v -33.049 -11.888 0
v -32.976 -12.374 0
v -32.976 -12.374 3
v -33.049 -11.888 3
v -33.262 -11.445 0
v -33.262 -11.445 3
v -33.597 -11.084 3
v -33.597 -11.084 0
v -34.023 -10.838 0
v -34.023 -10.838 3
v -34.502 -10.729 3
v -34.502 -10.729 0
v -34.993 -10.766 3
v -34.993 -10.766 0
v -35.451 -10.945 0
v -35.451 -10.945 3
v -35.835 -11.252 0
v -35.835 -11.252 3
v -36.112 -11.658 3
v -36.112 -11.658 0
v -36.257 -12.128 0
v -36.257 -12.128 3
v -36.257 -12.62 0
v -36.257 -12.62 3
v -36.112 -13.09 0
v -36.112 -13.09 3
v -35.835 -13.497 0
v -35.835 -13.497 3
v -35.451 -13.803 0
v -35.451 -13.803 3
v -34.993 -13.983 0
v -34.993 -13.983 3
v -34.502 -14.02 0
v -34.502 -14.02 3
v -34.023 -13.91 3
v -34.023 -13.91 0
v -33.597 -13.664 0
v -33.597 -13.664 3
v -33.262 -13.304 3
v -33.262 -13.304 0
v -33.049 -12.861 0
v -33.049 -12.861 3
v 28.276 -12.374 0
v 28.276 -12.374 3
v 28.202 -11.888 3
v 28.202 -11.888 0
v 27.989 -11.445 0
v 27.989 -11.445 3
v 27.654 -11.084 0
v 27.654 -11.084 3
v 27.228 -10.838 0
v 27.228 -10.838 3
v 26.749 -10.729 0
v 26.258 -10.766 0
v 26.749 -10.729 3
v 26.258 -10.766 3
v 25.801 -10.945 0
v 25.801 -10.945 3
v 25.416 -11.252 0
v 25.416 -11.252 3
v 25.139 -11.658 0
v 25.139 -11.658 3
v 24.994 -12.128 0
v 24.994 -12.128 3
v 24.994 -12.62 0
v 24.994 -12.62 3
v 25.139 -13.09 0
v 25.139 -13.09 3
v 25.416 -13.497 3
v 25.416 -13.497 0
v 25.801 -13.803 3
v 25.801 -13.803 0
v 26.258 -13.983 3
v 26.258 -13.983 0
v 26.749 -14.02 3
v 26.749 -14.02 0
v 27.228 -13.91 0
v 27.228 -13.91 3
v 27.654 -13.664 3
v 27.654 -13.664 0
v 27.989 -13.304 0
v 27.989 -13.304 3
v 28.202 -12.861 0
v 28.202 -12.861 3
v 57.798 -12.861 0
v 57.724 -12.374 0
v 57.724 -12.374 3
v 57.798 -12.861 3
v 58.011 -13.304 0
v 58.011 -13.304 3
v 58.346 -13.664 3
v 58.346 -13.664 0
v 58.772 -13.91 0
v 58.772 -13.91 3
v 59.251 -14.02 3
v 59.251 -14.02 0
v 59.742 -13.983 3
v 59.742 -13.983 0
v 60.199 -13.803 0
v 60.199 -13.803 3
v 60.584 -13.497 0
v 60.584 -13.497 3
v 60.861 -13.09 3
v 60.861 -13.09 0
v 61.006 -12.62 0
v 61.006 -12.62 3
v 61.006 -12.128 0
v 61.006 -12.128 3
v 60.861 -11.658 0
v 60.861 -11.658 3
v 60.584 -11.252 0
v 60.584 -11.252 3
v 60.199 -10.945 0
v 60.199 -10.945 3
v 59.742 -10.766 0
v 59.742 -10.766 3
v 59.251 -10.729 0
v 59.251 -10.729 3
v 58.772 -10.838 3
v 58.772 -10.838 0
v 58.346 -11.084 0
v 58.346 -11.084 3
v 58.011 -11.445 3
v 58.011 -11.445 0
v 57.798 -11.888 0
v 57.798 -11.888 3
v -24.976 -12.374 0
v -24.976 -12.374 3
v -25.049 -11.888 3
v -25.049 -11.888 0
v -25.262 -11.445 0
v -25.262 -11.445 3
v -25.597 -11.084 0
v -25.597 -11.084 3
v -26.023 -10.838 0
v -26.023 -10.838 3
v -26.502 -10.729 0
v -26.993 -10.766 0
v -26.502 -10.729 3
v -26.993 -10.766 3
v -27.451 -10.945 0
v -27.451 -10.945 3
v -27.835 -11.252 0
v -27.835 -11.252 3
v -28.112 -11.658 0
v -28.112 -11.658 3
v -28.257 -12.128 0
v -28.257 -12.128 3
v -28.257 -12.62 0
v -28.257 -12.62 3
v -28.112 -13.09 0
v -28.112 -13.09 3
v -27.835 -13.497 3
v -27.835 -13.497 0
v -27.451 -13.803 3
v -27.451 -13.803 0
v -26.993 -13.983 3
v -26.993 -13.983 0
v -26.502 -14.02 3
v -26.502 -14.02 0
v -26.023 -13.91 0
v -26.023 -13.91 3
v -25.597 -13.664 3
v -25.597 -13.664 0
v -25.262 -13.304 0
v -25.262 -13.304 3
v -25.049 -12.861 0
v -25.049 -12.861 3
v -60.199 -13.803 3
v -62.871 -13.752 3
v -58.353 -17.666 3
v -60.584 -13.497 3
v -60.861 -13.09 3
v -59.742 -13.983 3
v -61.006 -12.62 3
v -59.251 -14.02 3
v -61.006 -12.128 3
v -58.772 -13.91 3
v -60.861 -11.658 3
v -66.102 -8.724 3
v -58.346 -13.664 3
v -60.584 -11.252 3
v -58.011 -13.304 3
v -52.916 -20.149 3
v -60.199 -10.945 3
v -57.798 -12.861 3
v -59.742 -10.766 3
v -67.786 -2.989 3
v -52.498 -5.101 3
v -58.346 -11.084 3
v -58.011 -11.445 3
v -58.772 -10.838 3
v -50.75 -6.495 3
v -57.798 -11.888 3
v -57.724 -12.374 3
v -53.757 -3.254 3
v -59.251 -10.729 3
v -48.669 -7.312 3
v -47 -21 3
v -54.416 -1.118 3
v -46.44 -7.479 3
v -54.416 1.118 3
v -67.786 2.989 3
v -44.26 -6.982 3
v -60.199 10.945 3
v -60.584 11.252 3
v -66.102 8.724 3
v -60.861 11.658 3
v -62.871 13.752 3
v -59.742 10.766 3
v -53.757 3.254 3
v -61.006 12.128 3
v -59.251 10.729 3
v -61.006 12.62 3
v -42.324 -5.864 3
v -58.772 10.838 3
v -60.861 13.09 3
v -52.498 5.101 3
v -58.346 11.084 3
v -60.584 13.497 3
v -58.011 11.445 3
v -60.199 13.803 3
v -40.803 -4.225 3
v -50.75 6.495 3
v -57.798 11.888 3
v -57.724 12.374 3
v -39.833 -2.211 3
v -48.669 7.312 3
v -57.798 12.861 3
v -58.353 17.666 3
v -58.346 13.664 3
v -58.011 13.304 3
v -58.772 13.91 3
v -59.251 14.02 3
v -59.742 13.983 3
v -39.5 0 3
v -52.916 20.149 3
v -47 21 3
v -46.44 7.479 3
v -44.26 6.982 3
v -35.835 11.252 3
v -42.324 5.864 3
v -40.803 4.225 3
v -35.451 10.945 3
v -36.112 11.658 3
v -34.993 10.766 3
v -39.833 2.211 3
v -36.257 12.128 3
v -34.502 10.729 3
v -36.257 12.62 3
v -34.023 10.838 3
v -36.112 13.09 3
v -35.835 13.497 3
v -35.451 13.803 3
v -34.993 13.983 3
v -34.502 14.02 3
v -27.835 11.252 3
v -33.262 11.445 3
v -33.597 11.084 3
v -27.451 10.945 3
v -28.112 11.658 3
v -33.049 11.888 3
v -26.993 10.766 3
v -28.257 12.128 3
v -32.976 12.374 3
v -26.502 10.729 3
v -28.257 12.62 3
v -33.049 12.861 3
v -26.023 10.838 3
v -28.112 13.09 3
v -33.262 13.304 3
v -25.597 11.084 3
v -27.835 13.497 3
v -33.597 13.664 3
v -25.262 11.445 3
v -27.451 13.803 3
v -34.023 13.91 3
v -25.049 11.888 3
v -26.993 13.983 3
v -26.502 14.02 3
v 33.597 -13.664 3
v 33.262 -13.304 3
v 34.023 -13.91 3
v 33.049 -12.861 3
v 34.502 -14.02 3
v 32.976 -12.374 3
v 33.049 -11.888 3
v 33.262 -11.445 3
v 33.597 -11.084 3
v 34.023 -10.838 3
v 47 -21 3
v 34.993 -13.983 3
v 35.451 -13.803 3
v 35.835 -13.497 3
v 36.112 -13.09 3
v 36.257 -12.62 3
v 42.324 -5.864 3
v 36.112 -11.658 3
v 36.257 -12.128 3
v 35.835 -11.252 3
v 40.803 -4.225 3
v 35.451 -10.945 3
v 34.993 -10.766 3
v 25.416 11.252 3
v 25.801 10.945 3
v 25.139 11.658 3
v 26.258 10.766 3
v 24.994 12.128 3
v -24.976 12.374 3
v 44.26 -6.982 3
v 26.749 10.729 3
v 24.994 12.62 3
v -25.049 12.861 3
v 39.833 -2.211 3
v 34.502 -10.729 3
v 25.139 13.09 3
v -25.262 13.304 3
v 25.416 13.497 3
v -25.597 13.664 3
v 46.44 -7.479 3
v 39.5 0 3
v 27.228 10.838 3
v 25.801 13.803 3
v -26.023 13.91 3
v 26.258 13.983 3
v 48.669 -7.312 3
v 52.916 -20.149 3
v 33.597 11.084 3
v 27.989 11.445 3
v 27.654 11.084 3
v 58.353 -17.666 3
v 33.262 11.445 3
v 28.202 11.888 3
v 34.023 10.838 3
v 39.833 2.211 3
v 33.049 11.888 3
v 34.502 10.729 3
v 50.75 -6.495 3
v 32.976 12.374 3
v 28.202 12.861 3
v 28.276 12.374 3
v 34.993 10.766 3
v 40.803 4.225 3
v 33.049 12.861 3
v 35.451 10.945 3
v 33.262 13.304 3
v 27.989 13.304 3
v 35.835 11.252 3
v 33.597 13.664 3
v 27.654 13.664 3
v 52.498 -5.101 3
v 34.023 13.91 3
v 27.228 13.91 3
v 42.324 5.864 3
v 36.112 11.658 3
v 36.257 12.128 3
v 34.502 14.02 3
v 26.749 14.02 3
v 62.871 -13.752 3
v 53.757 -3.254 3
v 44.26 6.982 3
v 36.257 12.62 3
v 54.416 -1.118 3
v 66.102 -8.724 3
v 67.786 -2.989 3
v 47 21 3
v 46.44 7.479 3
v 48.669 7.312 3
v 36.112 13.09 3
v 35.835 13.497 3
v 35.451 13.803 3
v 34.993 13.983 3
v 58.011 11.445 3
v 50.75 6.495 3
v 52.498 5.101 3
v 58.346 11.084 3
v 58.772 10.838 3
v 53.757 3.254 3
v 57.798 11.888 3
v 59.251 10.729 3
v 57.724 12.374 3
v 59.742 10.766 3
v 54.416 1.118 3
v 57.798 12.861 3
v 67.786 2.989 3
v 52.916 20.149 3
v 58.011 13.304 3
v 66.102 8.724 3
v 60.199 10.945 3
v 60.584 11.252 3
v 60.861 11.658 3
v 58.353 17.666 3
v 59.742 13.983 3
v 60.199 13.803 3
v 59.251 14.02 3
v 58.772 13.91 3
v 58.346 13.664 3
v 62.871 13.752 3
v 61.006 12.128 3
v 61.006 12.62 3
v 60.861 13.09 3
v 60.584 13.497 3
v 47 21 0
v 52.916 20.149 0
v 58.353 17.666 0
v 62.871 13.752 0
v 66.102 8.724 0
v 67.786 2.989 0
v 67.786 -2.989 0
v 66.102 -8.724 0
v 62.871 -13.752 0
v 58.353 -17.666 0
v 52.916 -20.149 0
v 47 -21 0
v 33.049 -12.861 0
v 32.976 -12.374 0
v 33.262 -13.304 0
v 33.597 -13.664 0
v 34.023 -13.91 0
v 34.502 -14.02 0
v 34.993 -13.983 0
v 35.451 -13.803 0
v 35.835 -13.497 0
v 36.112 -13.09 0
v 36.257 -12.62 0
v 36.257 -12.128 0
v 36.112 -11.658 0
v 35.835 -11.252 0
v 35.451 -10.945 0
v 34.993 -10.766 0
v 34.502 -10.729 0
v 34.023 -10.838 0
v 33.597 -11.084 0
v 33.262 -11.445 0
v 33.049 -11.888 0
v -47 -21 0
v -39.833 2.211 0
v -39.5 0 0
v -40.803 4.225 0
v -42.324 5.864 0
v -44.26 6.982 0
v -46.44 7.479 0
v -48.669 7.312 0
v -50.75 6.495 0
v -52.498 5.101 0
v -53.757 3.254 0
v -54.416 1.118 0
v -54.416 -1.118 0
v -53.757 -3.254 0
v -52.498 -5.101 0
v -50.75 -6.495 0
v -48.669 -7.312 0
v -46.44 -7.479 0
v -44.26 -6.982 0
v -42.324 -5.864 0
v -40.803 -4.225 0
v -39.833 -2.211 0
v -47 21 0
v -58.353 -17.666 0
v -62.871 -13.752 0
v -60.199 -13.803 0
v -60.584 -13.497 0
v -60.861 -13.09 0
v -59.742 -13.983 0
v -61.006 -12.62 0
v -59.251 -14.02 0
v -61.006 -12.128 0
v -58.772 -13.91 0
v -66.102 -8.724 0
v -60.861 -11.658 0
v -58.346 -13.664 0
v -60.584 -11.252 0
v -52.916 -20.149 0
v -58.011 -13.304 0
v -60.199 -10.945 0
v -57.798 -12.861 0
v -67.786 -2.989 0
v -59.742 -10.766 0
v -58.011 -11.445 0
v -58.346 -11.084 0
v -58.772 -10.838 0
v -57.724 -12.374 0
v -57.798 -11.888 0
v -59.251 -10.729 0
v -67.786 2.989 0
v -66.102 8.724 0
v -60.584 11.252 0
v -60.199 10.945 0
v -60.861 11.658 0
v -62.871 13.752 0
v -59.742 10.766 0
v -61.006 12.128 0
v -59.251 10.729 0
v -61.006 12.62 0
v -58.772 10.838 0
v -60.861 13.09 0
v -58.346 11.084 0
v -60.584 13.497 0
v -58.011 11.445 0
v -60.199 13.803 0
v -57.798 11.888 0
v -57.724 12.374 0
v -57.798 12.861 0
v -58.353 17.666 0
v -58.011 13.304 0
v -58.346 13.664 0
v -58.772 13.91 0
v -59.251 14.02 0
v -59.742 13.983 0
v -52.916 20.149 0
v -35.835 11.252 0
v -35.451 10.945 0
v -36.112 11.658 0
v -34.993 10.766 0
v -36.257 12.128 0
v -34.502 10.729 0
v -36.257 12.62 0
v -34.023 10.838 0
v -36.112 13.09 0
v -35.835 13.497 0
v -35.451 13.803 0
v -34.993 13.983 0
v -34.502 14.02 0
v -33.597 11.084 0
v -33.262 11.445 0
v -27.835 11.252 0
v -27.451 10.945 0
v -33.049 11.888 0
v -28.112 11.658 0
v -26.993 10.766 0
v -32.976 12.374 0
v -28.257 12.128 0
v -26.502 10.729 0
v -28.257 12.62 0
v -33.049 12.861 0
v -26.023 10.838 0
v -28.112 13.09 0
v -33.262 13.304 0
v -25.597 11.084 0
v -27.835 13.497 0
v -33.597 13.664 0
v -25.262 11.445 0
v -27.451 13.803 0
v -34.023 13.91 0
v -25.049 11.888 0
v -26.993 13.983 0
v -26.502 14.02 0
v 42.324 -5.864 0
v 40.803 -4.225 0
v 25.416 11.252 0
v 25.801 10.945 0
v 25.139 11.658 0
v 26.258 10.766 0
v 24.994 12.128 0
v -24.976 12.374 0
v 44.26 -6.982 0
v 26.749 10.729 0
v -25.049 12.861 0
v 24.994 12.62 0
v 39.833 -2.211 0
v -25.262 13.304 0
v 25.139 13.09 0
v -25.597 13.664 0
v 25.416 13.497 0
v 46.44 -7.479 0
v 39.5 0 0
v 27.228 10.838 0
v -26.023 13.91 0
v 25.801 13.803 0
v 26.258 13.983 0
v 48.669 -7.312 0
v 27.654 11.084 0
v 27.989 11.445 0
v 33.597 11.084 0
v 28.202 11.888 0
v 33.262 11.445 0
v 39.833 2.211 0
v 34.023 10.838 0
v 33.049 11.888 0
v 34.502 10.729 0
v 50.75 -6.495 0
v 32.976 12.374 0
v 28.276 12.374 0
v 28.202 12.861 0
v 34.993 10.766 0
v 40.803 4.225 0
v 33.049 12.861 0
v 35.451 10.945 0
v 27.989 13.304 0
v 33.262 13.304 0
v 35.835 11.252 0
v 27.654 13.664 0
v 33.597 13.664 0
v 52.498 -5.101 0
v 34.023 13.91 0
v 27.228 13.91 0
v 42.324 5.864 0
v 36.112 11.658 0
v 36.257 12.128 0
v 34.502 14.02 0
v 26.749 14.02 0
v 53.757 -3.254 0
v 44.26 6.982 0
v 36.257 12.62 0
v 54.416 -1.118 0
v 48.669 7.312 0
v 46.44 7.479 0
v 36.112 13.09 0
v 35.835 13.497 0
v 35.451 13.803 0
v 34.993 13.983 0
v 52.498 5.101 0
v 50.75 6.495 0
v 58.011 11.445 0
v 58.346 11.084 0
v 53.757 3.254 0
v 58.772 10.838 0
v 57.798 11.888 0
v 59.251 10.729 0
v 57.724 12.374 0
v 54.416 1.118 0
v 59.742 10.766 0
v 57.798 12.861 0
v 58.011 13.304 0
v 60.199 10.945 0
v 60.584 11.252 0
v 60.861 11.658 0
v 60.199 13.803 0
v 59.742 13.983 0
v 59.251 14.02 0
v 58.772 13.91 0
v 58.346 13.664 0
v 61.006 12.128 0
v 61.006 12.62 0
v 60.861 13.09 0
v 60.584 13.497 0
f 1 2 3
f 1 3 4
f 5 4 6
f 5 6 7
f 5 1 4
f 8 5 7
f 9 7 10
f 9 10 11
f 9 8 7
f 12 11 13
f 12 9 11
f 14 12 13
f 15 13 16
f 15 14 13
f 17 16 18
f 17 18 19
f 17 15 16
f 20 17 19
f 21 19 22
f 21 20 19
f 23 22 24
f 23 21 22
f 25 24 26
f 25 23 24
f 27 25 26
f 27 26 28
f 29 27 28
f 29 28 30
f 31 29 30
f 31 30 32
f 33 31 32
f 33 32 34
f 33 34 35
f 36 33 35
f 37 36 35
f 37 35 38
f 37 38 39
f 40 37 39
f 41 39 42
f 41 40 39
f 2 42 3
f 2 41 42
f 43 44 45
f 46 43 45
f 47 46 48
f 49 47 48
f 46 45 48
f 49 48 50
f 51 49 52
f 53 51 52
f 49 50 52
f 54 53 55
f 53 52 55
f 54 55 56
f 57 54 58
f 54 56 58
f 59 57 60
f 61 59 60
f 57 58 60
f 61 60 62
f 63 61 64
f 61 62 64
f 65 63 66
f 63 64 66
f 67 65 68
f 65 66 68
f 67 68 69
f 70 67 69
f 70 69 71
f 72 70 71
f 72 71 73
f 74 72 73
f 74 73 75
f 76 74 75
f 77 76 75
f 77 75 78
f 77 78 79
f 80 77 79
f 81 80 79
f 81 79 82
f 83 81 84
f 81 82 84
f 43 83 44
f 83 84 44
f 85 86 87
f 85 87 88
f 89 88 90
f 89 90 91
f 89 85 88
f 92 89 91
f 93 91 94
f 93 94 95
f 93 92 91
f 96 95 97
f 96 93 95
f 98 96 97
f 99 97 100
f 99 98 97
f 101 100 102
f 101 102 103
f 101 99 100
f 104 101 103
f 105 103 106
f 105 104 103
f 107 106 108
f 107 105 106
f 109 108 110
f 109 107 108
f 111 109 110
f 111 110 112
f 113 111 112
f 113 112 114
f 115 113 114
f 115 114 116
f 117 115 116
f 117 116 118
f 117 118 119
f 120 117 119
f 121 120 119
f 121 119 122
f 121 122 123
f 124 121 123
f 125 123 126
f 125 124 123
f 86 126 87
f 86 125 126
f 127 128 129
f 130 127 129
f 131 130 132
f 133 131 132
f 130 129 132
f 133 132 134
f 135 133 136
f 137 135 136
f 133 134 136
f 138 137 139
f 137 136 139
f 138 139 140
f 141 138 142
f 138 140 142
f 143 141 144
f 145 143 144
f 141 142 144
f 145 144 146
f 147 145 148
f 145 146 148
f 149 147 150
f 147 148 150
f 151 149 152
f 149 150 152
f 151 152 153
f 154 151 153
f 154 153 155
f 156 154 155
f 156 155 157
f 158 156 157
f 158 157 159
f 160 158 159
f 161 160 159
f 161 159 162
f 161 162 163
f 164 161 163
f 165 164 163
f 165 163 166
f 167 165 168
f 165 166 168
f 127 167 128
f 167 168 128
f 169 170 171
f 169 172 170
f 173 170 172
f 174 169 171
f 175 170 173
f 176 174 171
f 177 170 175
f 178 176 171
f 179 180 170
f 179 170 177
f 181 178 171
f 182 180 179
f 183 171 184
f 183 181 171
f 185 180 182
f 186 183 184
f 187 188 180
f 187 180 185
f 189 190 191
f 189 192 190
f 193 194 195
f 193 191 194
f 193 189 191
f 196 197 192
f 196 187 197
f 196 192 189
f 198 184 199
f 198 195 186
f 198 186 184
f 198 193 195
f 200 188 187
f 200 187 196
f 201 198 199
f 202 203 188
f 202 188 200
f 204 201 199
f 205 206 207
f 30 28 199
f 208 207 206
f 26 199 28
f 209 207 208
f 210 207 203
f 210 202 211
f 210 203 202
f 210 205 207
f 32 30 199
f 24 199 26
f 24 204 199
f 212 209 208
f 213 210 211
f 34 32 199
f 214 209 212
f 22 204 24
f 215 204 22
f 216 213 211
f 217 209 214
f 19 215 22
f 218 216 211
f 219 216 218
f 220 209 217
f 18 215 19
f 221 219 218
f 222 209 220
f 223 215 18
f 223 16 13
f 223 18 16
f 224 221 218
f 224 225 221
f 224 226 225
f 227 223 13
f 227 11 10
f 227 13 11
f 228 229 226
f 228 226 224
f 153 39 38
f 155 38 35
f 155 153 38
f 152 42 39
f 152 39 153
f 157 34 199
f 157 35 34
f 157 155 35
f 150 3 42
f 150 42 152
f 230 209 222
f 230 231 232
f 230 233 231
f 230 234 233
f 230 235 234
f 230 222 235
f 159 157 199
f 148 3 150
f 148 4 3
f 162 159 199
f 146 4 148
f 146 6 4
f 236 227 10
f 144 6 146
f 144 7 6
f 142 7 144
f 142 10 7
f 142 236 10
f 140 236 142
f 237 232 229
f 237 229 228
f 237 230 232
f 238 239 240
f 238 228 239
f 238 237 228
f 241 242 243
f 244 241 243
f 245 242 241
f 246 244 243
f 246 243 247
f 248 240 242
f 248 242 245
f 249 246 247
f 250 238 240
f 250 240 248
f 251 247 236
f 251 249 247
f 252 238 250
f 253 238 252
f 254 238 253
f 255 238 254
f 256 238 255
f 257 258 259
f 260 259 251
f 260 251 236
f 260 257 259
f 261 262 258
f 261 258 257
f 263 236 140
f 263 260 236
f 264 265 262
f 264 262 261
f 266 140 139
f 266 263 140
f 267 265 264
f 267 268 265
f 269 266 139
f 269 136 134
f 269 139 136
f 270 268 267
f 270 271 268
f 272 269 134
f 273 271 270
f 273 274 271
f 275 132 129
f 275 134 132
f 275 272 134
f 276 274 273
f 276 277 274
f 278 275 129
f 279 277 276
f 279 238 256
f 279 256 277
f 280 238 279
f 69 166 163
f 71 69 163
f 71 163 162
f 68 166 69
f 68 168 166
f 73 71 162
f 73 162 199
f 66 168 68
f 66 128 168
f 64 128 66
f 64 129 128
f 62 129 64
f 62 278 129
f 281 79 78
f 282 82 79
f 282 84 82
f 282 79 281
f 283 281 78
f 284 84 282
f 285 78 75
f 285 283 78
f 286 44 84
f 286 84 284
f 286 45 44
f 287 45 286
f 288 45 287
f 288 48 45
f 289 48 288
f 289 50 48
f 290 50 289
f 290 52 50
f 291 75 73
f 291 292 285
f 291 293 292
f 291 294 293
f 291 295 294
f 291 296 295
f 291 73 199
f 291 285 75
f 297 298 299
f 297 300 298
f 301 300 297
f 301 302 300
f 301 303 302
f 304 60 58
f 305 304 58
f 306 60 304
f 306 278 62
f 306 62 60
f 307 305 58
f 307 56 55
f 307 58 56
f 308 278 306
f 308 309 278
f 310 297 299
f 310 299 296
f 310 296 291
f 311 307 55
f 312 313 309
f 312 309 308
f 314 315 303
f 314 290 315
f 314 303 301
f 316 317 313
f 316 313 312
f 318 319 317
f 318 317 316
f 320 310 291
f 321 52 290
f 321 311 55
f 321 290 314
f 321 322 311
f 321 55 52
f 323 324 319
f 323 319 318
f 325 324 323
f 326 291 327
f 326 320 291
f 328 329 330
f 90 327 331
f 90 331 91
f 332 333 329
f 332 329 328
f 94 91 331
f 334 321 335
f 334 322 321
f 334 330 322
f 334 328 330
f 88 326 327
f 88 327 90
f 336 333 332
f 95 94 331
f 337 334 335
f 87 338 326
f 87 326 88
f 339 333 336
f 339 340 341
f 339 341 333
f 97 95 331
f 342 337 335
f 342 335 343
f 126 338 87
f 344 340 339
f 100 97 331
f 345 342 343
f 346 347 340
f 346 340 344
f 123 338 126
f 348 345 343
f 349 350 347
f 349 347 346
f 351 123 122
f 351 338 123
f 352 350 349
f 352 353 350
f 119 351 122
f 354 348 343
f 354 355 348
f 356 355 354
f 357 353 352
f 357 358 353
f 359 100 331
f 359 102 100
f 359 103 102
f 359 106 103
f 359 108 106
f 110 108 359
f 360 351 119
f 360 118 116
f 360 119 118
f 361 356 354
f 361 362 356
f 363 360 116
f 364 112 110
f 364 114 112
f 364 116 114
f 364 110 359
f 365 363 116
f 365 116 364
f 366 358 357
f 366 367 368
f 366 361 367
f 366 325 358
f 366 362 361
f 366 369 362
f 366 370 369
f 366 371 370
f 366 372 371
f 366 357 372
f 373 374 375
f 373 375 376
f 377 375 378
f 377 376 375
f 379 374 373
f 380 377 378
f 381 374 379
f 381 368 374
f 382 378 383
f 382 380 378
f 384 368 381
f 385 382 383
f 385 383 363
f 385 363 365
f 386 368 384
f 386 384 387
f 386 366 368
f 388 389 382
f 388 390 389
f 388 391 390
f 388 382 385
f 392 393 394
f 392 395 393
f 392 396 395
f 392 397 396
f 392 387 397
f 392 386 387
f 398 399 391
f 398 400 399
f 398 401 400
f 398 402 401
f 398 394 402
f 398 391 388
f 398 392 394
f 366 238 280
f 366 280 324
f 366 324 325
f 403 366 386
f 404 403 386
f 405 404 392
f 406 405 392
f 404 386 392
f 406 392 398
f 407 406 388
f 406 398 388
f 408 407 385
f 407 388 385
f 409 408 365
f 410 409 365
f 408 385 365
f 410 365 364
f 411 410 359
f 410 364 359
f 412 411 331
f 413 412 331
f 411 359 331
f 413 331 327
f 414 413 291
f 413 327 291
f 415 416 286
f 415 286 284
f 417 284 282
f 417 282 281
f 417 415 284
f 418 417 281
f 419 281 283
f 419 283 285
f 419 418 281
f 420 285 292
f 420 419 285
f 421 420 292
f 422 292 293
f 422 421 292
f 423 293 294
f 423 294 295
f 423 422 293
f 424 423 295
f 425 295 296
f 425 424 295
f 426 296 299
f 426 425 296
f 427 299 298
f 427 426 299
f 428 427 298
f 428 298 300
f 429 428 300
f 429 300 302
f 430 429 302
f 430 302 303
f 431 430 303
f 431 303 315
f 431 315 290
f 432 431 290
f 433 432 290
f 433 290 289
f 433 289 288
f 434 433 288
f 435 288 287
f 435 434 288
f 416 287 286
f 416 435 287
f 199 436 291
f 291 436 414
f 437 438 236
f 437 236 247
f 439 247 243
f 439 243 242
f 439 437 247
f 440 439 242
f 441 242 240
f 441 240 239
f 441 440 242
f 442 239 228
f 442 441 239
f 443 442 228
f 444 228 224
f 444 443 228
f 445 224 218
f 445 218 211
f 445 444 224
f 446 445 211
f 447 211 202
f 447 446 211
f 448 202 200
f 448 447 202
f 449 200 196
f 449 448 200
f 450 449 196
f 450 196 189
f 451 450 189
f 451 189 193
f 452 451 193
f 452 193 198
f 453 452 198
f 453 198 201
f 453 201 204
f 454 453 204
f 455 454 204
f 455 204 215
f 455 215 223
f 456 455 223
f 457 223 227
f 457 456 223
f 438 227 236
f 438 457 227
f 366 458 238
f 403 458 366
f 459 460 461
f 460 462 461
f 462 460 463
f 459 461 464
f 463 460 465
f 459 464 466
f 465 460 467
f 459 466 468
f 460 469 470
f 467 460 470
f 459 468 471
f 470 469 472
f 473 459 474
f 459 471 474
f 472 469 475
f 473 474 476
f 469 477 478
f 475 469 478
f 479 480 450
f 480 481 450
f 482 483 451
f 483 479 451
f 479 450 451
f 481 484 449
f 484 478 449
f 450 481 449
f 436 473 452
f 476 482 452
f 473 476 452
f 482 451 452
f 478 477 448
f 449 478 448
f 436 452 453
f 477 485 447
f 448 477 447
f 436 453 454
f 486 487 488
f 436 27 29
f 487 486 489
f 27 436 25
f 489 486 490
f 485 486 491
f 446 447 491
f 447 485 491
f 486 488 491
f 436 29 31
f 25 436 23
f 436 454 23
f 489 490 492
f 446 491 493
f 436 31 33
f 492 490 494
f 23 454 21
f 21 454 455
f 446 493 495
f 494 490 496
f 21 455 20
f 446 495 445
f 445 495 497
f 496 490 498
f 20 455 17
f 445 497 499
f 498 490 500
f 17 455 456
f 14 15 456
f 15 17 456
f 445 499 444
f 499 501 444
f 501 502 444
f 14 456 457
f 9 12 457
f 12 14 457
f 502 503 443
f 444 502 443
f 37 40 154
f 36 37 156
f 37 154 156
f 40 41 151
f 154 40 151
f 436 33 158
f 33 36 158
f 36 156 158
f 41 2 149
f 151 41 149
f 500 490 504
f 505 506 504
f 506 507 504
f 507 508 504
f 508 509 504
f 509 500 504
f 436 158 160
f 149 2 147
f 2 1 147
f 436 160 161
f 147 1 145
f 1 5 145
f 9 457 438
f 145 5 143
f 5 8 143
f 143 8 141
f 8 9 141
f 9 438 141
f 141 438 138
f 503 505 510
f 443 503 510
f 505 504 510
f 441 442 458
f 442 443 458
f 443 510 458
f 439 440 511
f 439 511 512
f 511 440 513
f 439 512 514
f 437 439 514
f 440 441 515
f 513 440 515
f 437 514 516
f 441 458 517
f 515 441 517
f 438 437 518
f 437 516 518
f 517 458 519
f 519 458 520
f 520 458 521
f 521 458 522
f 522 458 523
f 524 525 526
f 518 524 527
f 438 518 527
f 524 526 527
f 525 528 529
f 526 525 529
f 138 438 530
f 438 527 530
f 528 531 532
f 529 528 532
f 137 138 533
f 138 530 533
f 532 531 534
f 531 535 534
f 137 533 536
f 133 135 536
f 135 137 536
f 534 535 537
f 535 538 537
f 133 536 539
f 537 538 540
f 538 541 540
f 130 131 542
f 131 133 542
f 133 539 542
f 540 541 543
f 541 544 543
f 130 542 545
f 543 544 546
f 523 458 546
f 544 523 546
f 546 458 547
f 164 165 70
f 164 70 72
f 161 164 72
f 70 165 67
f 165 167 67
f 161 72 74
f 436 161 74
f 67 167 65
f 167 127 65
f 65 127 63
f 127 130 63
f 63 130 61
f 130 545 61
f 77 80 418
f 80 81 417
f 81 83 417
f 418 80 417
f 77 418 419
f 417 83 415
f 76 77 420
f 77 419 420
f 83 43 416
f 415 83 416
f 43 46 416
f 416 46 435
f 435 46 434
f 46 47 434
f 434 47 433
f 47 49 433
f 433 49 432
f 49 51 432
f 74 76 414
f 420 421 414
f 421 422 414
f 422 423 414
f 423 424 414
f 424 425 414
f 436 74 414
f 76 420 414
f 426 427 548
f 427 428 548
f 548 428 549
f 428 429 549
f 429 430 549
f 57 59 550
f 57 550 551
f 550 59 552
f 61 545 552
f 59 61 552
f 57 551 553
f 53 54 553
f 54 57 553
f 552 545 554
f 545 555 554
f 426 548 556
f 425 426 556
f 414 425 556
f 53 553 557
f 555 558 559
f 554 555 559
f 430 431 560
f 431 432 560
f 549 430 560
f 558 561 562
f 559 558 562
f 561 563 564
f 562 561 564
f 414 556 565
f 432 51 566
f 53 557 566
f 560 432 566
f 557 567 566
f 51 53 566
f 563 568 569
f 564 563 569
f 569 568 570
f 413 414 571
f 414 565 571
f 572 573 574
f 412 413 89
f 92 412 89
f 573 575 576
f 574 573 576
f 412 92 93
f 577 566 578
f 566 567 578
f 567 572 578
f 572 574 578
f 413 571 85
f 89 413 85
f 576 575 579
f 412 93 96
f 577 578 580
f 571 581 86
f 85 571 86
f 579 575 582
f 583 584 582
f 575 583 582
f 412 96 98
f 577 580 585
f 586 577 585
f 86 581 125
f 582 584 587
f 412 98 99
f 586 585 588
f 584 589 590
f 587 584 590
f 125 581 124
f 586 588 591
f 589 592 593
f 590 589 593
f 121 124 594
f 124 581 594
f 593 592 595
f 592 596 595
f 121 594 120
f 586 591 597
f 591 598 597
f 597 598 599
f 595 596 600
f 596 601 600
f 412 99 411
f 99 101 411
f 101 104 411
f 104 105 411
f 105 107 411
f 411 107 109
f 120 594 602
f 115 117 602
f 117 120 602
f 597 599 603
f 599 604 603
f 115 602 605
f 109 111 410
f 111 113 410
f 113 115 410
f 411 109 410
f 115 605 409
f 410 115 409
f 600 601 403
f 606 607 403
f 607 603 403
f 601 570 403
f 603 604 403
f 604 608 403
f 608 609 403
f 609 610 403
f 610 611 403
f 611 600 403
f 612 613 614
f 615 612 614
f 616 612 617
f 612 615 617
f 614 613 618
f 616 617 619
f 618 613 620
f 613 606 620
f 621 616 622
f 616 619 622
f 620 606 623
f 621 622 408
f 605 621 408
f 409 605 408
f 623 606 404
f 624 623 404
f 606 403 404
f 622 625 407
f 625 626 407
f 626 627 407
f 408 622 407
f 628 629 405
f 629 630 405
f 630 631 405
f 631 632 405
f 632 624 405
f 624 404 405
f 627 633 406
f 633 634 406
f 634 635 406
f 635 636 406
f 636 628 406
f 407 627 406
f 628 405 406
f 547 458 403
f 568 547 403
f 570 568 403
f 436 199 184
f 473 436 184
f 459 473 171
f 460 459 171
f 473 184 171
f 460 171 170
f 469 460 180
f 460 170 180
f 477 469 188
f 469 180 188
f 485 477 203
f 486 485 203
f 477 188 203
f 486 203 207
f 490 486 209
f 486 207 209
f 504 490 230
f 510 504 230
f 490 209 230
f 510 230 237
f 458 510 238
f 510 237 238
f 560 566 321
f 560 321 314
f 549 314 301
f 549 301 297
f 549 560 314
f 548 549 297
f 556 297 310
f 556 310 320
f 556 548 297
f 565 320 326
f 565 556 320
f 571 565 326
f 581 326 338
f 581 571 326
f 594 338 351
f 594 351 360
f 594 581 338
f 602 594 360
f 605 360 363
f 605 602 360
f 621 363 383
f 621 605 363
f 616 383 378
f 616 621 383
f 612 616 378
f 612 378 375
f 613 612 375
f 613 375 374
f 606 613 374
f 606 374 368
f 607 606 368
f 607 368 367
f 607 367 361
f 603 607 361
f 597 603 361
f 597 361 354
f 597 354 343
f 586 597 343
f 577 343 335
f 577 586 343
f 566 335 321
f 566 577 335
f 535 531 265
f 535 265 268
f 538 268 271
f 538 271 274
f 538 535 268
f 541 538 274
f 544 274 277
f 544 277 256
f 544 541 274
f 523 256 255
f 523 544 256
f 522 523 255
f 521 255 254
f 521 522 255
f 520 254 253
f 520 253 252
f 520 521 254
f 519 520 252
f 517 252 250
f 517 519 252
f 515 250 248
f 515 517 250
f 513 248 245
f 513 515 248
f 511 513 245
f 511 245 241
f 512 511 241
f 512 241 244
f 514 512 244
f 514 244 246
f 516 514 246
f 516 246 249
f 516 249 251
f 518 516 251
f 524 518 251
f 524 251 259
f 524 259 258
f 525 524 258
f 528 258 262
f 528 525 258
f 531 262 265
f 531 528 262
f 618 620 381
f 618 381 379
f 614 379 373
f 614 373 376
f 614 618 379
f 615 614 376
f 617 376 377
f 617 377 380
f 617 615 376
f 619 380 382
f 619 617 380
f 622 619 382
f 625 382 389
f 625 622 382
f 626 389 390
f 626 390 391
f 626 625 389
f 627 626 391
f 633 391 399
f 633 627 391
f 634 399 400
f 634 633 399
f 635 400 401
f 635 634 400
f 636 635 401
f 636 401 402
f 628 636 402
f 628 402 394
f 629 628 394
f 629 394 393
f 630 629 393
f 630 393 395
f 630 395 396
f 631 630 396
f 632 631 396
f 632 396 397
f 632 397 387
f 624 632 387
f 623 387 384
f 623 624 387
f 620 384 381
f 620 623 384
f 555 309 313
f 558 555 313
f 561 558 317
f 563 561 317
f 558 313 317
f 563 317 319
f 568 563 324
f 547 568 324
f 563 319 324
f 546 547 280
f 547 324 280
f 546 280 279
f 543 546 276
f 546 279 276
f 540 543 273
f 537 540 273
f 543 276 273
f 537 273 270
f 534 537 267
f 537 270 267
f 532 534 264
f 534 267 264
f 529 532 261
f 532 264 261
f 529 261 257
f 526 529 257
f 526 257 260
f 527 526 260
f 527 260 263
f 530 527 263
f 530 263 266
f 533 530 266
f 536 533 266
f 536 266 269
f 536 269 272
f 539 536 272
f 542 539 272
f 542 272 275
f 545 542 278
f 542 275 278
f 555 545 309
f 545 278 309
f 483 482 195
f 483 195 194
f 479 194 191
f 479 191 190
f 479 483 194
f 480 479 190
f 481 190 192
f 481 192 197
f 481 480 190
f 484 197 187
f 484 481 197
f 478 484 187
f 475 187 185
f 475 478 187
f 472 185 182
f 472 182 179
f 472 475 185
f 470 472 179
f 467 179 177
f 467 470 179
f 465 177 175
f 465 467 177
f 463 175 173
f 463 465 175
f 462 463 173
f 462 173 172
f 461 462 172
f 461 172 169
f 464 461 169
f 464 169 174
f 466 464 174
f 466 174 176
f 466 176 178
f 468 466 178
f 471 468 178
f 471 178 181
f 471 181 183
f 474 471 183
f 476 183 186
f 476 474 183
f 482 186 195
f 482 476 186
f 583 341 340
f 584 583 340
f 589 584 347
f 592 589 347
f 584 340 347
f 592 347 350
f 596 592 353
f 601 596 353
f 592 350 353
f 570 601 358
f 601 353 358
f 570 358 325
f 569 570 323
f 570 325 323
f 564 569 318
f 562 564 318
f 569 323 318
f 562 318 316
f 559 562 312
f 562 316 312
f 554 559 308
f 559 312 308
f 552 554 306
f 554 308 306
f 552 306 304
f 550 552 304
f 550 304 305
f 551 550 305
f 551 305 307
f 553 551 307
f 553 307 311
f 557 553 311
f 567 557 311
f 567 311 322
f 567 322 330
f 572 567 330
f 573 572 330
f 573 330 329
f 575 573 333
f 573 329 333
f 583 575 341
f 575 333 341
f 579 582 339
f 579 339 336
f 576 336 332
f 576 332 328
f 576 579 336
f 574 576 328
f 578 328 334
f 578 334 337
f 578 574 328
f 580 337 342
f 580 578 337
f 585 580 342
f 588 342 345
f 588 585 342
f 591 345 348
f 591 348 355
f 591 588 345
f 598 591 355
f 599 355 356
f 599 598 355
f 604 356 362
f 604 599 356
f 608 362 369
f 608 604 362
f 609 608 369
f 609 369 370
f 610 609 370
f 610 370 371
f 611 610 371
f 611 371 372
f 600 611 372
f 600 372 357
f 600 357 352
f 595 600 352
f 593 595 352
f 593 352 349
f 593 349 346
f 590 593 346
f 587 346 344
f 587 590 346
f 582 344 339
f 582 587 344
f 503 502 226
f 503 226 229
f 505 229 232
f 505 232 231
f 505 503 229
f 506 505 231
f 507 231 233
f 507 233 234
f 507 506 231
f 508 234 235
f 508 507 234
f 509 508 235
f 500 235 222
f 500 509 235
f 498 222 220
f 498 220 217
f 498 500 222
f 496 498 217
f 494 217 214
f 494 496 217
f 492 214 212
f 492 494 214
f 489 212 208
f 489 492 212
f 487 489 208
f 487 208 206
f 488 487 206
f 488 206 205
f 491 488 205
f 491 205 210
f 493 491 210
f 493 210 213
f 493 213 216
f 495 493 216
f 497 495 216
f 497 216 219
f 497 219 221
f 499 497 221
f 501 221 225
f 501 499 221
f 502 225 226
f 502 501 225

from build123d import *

# Parameters (mm, degrees)
SKETCH_1_W          = 165
SKETCH_1_H          = 42
SKETCH_1_R          = 7.5
SKETCH_1_R_2        = 1.65
EXTRUDE_1_DEPTH     = 3
CUT_EXTRUDE_1_DEPTH = 3
SKETCH_3_R          = 1.65
CUT_EXTRUDE_2_DEPTH = 3


with BuildPart() as part:
    # 草图1 → 凸台-拉伸1 (new body)
    with BuildSketch(Plane.XY):
        Rectangle(SKETCH_1_W, SKETCH_1_H)
        with Locations((-47, 0)):
            Circle(SKETCH_1_R, mode=Mode.SUBTRACT)
        with Locations((-75, 10)):
            Circle(SKETCH_1_R_2, mode=Mode.SUBTRACT)
        with Locations((-75, -10)):
            Circle(SKETCH_1_R_2, mode=Mode.SUBTRACT)
        with Locations((75, 10)):
            Circle(SKETCH_1_R_2, mode=Mode.SUBTRACT)
        with Locations((75, -10)):
            Circle(SKETCH_1_R_2, mode=Mode.SUBTRACT)
        with Locations((-59.374368671, 12.374368671)):
            Circle(SKETCH_1_R_2, mode=Mode.SUBTRACT)
        with Locations((-34.625631329, 12.374368671)):
            Circle(SKETCH_1_R_2, mode=Mode.SUBTRACT)
        with Locations((-34.625631329, -12.374368671)):
            Circle(SKETCH_1_R_2, mode=Mode.SUBTRACT)
        with Locations((-59.374368671, -12.374368671)):
            Circle(SKETCH_1_R_2, mode=Mode.SUBTRACT)
        with Locations(Location((59.374368671, -12.374368671, 0), (0, 0, 180))):
            Circle(SKETCH_1_R_2, mode=Mode.SUBTRACT)
        with Locations(Location((34.625631329, -12.374368671, 0), (0, 0, 180))):
            Circle(SKETCH_1_R_2, mode=Mode.SUBTRACT)
        with Locations(Location((34.625631329, 12.374368671, 0), (0, 0, 180))):
            Circle(SKETCH_1_R_2, mode=Mode.SUBTRACT)
        with Locations(Location((59.374368671, 12.374368671, 0), (0, 0, 180))):
            Circle(SKETCH_1_R_2, mode=Mode.SUBTRACT)
        with Locations(Location((47, 0, 0), (0, 0, 180))):
            Circle(SKETCH_1_R, mode=Mode.SUBTRACT)
    extrude(amount=EXTRUDE_1_DEPTH)

    # 草图2 → 切除-拉伸1 (cut)
    with BuildSketch(Plane.XY.offset(3)):
        with BuildLine():
            Line((-47, 21), (-82.5, 21))
            Line((-82.5, 21), (-82.5, -21))
            Line((-82.5, -21), (-47, -21))
            ThreePointArc((-47, -21), (-68, 0), (-47, 21))
        make_face()
        with BuildLine():
            Line((47, -21), (82.5, -21))
            Line((82.5, -21), (82.5, 21))
            Line((82.5, 21), (47, 21))
            ThreePointArc((47, 21), (68, 0), (47, -21))
        make_face()
    extrude(amount=-CUT_EXTRUDE_1_DEPTH, mode=Mode.SUBTRACT)

    # 草图3 → 切除-拉伸2 (cut)
    with BuildSketch(Plane.XY.offset(3)):
        with Locations((-26.625631329, 12.374368671)):
            Circle(SKETCH_3_R)
        with Locations((-26.625631329, -12.374368671)):
            Circle(SKETCH_3_R)
        with Locations((26.625631329, 12.374368671)):
            Circle(SKETCH_3_R)
        with Locations((26.625631329, -12.374368671)):
            Circle(SKETCH_3_R)
    extrude(amount=-CUT_EXTRUDE_2_DEPTH, mode=Mode.SUBTRACT)


solid = part.part
